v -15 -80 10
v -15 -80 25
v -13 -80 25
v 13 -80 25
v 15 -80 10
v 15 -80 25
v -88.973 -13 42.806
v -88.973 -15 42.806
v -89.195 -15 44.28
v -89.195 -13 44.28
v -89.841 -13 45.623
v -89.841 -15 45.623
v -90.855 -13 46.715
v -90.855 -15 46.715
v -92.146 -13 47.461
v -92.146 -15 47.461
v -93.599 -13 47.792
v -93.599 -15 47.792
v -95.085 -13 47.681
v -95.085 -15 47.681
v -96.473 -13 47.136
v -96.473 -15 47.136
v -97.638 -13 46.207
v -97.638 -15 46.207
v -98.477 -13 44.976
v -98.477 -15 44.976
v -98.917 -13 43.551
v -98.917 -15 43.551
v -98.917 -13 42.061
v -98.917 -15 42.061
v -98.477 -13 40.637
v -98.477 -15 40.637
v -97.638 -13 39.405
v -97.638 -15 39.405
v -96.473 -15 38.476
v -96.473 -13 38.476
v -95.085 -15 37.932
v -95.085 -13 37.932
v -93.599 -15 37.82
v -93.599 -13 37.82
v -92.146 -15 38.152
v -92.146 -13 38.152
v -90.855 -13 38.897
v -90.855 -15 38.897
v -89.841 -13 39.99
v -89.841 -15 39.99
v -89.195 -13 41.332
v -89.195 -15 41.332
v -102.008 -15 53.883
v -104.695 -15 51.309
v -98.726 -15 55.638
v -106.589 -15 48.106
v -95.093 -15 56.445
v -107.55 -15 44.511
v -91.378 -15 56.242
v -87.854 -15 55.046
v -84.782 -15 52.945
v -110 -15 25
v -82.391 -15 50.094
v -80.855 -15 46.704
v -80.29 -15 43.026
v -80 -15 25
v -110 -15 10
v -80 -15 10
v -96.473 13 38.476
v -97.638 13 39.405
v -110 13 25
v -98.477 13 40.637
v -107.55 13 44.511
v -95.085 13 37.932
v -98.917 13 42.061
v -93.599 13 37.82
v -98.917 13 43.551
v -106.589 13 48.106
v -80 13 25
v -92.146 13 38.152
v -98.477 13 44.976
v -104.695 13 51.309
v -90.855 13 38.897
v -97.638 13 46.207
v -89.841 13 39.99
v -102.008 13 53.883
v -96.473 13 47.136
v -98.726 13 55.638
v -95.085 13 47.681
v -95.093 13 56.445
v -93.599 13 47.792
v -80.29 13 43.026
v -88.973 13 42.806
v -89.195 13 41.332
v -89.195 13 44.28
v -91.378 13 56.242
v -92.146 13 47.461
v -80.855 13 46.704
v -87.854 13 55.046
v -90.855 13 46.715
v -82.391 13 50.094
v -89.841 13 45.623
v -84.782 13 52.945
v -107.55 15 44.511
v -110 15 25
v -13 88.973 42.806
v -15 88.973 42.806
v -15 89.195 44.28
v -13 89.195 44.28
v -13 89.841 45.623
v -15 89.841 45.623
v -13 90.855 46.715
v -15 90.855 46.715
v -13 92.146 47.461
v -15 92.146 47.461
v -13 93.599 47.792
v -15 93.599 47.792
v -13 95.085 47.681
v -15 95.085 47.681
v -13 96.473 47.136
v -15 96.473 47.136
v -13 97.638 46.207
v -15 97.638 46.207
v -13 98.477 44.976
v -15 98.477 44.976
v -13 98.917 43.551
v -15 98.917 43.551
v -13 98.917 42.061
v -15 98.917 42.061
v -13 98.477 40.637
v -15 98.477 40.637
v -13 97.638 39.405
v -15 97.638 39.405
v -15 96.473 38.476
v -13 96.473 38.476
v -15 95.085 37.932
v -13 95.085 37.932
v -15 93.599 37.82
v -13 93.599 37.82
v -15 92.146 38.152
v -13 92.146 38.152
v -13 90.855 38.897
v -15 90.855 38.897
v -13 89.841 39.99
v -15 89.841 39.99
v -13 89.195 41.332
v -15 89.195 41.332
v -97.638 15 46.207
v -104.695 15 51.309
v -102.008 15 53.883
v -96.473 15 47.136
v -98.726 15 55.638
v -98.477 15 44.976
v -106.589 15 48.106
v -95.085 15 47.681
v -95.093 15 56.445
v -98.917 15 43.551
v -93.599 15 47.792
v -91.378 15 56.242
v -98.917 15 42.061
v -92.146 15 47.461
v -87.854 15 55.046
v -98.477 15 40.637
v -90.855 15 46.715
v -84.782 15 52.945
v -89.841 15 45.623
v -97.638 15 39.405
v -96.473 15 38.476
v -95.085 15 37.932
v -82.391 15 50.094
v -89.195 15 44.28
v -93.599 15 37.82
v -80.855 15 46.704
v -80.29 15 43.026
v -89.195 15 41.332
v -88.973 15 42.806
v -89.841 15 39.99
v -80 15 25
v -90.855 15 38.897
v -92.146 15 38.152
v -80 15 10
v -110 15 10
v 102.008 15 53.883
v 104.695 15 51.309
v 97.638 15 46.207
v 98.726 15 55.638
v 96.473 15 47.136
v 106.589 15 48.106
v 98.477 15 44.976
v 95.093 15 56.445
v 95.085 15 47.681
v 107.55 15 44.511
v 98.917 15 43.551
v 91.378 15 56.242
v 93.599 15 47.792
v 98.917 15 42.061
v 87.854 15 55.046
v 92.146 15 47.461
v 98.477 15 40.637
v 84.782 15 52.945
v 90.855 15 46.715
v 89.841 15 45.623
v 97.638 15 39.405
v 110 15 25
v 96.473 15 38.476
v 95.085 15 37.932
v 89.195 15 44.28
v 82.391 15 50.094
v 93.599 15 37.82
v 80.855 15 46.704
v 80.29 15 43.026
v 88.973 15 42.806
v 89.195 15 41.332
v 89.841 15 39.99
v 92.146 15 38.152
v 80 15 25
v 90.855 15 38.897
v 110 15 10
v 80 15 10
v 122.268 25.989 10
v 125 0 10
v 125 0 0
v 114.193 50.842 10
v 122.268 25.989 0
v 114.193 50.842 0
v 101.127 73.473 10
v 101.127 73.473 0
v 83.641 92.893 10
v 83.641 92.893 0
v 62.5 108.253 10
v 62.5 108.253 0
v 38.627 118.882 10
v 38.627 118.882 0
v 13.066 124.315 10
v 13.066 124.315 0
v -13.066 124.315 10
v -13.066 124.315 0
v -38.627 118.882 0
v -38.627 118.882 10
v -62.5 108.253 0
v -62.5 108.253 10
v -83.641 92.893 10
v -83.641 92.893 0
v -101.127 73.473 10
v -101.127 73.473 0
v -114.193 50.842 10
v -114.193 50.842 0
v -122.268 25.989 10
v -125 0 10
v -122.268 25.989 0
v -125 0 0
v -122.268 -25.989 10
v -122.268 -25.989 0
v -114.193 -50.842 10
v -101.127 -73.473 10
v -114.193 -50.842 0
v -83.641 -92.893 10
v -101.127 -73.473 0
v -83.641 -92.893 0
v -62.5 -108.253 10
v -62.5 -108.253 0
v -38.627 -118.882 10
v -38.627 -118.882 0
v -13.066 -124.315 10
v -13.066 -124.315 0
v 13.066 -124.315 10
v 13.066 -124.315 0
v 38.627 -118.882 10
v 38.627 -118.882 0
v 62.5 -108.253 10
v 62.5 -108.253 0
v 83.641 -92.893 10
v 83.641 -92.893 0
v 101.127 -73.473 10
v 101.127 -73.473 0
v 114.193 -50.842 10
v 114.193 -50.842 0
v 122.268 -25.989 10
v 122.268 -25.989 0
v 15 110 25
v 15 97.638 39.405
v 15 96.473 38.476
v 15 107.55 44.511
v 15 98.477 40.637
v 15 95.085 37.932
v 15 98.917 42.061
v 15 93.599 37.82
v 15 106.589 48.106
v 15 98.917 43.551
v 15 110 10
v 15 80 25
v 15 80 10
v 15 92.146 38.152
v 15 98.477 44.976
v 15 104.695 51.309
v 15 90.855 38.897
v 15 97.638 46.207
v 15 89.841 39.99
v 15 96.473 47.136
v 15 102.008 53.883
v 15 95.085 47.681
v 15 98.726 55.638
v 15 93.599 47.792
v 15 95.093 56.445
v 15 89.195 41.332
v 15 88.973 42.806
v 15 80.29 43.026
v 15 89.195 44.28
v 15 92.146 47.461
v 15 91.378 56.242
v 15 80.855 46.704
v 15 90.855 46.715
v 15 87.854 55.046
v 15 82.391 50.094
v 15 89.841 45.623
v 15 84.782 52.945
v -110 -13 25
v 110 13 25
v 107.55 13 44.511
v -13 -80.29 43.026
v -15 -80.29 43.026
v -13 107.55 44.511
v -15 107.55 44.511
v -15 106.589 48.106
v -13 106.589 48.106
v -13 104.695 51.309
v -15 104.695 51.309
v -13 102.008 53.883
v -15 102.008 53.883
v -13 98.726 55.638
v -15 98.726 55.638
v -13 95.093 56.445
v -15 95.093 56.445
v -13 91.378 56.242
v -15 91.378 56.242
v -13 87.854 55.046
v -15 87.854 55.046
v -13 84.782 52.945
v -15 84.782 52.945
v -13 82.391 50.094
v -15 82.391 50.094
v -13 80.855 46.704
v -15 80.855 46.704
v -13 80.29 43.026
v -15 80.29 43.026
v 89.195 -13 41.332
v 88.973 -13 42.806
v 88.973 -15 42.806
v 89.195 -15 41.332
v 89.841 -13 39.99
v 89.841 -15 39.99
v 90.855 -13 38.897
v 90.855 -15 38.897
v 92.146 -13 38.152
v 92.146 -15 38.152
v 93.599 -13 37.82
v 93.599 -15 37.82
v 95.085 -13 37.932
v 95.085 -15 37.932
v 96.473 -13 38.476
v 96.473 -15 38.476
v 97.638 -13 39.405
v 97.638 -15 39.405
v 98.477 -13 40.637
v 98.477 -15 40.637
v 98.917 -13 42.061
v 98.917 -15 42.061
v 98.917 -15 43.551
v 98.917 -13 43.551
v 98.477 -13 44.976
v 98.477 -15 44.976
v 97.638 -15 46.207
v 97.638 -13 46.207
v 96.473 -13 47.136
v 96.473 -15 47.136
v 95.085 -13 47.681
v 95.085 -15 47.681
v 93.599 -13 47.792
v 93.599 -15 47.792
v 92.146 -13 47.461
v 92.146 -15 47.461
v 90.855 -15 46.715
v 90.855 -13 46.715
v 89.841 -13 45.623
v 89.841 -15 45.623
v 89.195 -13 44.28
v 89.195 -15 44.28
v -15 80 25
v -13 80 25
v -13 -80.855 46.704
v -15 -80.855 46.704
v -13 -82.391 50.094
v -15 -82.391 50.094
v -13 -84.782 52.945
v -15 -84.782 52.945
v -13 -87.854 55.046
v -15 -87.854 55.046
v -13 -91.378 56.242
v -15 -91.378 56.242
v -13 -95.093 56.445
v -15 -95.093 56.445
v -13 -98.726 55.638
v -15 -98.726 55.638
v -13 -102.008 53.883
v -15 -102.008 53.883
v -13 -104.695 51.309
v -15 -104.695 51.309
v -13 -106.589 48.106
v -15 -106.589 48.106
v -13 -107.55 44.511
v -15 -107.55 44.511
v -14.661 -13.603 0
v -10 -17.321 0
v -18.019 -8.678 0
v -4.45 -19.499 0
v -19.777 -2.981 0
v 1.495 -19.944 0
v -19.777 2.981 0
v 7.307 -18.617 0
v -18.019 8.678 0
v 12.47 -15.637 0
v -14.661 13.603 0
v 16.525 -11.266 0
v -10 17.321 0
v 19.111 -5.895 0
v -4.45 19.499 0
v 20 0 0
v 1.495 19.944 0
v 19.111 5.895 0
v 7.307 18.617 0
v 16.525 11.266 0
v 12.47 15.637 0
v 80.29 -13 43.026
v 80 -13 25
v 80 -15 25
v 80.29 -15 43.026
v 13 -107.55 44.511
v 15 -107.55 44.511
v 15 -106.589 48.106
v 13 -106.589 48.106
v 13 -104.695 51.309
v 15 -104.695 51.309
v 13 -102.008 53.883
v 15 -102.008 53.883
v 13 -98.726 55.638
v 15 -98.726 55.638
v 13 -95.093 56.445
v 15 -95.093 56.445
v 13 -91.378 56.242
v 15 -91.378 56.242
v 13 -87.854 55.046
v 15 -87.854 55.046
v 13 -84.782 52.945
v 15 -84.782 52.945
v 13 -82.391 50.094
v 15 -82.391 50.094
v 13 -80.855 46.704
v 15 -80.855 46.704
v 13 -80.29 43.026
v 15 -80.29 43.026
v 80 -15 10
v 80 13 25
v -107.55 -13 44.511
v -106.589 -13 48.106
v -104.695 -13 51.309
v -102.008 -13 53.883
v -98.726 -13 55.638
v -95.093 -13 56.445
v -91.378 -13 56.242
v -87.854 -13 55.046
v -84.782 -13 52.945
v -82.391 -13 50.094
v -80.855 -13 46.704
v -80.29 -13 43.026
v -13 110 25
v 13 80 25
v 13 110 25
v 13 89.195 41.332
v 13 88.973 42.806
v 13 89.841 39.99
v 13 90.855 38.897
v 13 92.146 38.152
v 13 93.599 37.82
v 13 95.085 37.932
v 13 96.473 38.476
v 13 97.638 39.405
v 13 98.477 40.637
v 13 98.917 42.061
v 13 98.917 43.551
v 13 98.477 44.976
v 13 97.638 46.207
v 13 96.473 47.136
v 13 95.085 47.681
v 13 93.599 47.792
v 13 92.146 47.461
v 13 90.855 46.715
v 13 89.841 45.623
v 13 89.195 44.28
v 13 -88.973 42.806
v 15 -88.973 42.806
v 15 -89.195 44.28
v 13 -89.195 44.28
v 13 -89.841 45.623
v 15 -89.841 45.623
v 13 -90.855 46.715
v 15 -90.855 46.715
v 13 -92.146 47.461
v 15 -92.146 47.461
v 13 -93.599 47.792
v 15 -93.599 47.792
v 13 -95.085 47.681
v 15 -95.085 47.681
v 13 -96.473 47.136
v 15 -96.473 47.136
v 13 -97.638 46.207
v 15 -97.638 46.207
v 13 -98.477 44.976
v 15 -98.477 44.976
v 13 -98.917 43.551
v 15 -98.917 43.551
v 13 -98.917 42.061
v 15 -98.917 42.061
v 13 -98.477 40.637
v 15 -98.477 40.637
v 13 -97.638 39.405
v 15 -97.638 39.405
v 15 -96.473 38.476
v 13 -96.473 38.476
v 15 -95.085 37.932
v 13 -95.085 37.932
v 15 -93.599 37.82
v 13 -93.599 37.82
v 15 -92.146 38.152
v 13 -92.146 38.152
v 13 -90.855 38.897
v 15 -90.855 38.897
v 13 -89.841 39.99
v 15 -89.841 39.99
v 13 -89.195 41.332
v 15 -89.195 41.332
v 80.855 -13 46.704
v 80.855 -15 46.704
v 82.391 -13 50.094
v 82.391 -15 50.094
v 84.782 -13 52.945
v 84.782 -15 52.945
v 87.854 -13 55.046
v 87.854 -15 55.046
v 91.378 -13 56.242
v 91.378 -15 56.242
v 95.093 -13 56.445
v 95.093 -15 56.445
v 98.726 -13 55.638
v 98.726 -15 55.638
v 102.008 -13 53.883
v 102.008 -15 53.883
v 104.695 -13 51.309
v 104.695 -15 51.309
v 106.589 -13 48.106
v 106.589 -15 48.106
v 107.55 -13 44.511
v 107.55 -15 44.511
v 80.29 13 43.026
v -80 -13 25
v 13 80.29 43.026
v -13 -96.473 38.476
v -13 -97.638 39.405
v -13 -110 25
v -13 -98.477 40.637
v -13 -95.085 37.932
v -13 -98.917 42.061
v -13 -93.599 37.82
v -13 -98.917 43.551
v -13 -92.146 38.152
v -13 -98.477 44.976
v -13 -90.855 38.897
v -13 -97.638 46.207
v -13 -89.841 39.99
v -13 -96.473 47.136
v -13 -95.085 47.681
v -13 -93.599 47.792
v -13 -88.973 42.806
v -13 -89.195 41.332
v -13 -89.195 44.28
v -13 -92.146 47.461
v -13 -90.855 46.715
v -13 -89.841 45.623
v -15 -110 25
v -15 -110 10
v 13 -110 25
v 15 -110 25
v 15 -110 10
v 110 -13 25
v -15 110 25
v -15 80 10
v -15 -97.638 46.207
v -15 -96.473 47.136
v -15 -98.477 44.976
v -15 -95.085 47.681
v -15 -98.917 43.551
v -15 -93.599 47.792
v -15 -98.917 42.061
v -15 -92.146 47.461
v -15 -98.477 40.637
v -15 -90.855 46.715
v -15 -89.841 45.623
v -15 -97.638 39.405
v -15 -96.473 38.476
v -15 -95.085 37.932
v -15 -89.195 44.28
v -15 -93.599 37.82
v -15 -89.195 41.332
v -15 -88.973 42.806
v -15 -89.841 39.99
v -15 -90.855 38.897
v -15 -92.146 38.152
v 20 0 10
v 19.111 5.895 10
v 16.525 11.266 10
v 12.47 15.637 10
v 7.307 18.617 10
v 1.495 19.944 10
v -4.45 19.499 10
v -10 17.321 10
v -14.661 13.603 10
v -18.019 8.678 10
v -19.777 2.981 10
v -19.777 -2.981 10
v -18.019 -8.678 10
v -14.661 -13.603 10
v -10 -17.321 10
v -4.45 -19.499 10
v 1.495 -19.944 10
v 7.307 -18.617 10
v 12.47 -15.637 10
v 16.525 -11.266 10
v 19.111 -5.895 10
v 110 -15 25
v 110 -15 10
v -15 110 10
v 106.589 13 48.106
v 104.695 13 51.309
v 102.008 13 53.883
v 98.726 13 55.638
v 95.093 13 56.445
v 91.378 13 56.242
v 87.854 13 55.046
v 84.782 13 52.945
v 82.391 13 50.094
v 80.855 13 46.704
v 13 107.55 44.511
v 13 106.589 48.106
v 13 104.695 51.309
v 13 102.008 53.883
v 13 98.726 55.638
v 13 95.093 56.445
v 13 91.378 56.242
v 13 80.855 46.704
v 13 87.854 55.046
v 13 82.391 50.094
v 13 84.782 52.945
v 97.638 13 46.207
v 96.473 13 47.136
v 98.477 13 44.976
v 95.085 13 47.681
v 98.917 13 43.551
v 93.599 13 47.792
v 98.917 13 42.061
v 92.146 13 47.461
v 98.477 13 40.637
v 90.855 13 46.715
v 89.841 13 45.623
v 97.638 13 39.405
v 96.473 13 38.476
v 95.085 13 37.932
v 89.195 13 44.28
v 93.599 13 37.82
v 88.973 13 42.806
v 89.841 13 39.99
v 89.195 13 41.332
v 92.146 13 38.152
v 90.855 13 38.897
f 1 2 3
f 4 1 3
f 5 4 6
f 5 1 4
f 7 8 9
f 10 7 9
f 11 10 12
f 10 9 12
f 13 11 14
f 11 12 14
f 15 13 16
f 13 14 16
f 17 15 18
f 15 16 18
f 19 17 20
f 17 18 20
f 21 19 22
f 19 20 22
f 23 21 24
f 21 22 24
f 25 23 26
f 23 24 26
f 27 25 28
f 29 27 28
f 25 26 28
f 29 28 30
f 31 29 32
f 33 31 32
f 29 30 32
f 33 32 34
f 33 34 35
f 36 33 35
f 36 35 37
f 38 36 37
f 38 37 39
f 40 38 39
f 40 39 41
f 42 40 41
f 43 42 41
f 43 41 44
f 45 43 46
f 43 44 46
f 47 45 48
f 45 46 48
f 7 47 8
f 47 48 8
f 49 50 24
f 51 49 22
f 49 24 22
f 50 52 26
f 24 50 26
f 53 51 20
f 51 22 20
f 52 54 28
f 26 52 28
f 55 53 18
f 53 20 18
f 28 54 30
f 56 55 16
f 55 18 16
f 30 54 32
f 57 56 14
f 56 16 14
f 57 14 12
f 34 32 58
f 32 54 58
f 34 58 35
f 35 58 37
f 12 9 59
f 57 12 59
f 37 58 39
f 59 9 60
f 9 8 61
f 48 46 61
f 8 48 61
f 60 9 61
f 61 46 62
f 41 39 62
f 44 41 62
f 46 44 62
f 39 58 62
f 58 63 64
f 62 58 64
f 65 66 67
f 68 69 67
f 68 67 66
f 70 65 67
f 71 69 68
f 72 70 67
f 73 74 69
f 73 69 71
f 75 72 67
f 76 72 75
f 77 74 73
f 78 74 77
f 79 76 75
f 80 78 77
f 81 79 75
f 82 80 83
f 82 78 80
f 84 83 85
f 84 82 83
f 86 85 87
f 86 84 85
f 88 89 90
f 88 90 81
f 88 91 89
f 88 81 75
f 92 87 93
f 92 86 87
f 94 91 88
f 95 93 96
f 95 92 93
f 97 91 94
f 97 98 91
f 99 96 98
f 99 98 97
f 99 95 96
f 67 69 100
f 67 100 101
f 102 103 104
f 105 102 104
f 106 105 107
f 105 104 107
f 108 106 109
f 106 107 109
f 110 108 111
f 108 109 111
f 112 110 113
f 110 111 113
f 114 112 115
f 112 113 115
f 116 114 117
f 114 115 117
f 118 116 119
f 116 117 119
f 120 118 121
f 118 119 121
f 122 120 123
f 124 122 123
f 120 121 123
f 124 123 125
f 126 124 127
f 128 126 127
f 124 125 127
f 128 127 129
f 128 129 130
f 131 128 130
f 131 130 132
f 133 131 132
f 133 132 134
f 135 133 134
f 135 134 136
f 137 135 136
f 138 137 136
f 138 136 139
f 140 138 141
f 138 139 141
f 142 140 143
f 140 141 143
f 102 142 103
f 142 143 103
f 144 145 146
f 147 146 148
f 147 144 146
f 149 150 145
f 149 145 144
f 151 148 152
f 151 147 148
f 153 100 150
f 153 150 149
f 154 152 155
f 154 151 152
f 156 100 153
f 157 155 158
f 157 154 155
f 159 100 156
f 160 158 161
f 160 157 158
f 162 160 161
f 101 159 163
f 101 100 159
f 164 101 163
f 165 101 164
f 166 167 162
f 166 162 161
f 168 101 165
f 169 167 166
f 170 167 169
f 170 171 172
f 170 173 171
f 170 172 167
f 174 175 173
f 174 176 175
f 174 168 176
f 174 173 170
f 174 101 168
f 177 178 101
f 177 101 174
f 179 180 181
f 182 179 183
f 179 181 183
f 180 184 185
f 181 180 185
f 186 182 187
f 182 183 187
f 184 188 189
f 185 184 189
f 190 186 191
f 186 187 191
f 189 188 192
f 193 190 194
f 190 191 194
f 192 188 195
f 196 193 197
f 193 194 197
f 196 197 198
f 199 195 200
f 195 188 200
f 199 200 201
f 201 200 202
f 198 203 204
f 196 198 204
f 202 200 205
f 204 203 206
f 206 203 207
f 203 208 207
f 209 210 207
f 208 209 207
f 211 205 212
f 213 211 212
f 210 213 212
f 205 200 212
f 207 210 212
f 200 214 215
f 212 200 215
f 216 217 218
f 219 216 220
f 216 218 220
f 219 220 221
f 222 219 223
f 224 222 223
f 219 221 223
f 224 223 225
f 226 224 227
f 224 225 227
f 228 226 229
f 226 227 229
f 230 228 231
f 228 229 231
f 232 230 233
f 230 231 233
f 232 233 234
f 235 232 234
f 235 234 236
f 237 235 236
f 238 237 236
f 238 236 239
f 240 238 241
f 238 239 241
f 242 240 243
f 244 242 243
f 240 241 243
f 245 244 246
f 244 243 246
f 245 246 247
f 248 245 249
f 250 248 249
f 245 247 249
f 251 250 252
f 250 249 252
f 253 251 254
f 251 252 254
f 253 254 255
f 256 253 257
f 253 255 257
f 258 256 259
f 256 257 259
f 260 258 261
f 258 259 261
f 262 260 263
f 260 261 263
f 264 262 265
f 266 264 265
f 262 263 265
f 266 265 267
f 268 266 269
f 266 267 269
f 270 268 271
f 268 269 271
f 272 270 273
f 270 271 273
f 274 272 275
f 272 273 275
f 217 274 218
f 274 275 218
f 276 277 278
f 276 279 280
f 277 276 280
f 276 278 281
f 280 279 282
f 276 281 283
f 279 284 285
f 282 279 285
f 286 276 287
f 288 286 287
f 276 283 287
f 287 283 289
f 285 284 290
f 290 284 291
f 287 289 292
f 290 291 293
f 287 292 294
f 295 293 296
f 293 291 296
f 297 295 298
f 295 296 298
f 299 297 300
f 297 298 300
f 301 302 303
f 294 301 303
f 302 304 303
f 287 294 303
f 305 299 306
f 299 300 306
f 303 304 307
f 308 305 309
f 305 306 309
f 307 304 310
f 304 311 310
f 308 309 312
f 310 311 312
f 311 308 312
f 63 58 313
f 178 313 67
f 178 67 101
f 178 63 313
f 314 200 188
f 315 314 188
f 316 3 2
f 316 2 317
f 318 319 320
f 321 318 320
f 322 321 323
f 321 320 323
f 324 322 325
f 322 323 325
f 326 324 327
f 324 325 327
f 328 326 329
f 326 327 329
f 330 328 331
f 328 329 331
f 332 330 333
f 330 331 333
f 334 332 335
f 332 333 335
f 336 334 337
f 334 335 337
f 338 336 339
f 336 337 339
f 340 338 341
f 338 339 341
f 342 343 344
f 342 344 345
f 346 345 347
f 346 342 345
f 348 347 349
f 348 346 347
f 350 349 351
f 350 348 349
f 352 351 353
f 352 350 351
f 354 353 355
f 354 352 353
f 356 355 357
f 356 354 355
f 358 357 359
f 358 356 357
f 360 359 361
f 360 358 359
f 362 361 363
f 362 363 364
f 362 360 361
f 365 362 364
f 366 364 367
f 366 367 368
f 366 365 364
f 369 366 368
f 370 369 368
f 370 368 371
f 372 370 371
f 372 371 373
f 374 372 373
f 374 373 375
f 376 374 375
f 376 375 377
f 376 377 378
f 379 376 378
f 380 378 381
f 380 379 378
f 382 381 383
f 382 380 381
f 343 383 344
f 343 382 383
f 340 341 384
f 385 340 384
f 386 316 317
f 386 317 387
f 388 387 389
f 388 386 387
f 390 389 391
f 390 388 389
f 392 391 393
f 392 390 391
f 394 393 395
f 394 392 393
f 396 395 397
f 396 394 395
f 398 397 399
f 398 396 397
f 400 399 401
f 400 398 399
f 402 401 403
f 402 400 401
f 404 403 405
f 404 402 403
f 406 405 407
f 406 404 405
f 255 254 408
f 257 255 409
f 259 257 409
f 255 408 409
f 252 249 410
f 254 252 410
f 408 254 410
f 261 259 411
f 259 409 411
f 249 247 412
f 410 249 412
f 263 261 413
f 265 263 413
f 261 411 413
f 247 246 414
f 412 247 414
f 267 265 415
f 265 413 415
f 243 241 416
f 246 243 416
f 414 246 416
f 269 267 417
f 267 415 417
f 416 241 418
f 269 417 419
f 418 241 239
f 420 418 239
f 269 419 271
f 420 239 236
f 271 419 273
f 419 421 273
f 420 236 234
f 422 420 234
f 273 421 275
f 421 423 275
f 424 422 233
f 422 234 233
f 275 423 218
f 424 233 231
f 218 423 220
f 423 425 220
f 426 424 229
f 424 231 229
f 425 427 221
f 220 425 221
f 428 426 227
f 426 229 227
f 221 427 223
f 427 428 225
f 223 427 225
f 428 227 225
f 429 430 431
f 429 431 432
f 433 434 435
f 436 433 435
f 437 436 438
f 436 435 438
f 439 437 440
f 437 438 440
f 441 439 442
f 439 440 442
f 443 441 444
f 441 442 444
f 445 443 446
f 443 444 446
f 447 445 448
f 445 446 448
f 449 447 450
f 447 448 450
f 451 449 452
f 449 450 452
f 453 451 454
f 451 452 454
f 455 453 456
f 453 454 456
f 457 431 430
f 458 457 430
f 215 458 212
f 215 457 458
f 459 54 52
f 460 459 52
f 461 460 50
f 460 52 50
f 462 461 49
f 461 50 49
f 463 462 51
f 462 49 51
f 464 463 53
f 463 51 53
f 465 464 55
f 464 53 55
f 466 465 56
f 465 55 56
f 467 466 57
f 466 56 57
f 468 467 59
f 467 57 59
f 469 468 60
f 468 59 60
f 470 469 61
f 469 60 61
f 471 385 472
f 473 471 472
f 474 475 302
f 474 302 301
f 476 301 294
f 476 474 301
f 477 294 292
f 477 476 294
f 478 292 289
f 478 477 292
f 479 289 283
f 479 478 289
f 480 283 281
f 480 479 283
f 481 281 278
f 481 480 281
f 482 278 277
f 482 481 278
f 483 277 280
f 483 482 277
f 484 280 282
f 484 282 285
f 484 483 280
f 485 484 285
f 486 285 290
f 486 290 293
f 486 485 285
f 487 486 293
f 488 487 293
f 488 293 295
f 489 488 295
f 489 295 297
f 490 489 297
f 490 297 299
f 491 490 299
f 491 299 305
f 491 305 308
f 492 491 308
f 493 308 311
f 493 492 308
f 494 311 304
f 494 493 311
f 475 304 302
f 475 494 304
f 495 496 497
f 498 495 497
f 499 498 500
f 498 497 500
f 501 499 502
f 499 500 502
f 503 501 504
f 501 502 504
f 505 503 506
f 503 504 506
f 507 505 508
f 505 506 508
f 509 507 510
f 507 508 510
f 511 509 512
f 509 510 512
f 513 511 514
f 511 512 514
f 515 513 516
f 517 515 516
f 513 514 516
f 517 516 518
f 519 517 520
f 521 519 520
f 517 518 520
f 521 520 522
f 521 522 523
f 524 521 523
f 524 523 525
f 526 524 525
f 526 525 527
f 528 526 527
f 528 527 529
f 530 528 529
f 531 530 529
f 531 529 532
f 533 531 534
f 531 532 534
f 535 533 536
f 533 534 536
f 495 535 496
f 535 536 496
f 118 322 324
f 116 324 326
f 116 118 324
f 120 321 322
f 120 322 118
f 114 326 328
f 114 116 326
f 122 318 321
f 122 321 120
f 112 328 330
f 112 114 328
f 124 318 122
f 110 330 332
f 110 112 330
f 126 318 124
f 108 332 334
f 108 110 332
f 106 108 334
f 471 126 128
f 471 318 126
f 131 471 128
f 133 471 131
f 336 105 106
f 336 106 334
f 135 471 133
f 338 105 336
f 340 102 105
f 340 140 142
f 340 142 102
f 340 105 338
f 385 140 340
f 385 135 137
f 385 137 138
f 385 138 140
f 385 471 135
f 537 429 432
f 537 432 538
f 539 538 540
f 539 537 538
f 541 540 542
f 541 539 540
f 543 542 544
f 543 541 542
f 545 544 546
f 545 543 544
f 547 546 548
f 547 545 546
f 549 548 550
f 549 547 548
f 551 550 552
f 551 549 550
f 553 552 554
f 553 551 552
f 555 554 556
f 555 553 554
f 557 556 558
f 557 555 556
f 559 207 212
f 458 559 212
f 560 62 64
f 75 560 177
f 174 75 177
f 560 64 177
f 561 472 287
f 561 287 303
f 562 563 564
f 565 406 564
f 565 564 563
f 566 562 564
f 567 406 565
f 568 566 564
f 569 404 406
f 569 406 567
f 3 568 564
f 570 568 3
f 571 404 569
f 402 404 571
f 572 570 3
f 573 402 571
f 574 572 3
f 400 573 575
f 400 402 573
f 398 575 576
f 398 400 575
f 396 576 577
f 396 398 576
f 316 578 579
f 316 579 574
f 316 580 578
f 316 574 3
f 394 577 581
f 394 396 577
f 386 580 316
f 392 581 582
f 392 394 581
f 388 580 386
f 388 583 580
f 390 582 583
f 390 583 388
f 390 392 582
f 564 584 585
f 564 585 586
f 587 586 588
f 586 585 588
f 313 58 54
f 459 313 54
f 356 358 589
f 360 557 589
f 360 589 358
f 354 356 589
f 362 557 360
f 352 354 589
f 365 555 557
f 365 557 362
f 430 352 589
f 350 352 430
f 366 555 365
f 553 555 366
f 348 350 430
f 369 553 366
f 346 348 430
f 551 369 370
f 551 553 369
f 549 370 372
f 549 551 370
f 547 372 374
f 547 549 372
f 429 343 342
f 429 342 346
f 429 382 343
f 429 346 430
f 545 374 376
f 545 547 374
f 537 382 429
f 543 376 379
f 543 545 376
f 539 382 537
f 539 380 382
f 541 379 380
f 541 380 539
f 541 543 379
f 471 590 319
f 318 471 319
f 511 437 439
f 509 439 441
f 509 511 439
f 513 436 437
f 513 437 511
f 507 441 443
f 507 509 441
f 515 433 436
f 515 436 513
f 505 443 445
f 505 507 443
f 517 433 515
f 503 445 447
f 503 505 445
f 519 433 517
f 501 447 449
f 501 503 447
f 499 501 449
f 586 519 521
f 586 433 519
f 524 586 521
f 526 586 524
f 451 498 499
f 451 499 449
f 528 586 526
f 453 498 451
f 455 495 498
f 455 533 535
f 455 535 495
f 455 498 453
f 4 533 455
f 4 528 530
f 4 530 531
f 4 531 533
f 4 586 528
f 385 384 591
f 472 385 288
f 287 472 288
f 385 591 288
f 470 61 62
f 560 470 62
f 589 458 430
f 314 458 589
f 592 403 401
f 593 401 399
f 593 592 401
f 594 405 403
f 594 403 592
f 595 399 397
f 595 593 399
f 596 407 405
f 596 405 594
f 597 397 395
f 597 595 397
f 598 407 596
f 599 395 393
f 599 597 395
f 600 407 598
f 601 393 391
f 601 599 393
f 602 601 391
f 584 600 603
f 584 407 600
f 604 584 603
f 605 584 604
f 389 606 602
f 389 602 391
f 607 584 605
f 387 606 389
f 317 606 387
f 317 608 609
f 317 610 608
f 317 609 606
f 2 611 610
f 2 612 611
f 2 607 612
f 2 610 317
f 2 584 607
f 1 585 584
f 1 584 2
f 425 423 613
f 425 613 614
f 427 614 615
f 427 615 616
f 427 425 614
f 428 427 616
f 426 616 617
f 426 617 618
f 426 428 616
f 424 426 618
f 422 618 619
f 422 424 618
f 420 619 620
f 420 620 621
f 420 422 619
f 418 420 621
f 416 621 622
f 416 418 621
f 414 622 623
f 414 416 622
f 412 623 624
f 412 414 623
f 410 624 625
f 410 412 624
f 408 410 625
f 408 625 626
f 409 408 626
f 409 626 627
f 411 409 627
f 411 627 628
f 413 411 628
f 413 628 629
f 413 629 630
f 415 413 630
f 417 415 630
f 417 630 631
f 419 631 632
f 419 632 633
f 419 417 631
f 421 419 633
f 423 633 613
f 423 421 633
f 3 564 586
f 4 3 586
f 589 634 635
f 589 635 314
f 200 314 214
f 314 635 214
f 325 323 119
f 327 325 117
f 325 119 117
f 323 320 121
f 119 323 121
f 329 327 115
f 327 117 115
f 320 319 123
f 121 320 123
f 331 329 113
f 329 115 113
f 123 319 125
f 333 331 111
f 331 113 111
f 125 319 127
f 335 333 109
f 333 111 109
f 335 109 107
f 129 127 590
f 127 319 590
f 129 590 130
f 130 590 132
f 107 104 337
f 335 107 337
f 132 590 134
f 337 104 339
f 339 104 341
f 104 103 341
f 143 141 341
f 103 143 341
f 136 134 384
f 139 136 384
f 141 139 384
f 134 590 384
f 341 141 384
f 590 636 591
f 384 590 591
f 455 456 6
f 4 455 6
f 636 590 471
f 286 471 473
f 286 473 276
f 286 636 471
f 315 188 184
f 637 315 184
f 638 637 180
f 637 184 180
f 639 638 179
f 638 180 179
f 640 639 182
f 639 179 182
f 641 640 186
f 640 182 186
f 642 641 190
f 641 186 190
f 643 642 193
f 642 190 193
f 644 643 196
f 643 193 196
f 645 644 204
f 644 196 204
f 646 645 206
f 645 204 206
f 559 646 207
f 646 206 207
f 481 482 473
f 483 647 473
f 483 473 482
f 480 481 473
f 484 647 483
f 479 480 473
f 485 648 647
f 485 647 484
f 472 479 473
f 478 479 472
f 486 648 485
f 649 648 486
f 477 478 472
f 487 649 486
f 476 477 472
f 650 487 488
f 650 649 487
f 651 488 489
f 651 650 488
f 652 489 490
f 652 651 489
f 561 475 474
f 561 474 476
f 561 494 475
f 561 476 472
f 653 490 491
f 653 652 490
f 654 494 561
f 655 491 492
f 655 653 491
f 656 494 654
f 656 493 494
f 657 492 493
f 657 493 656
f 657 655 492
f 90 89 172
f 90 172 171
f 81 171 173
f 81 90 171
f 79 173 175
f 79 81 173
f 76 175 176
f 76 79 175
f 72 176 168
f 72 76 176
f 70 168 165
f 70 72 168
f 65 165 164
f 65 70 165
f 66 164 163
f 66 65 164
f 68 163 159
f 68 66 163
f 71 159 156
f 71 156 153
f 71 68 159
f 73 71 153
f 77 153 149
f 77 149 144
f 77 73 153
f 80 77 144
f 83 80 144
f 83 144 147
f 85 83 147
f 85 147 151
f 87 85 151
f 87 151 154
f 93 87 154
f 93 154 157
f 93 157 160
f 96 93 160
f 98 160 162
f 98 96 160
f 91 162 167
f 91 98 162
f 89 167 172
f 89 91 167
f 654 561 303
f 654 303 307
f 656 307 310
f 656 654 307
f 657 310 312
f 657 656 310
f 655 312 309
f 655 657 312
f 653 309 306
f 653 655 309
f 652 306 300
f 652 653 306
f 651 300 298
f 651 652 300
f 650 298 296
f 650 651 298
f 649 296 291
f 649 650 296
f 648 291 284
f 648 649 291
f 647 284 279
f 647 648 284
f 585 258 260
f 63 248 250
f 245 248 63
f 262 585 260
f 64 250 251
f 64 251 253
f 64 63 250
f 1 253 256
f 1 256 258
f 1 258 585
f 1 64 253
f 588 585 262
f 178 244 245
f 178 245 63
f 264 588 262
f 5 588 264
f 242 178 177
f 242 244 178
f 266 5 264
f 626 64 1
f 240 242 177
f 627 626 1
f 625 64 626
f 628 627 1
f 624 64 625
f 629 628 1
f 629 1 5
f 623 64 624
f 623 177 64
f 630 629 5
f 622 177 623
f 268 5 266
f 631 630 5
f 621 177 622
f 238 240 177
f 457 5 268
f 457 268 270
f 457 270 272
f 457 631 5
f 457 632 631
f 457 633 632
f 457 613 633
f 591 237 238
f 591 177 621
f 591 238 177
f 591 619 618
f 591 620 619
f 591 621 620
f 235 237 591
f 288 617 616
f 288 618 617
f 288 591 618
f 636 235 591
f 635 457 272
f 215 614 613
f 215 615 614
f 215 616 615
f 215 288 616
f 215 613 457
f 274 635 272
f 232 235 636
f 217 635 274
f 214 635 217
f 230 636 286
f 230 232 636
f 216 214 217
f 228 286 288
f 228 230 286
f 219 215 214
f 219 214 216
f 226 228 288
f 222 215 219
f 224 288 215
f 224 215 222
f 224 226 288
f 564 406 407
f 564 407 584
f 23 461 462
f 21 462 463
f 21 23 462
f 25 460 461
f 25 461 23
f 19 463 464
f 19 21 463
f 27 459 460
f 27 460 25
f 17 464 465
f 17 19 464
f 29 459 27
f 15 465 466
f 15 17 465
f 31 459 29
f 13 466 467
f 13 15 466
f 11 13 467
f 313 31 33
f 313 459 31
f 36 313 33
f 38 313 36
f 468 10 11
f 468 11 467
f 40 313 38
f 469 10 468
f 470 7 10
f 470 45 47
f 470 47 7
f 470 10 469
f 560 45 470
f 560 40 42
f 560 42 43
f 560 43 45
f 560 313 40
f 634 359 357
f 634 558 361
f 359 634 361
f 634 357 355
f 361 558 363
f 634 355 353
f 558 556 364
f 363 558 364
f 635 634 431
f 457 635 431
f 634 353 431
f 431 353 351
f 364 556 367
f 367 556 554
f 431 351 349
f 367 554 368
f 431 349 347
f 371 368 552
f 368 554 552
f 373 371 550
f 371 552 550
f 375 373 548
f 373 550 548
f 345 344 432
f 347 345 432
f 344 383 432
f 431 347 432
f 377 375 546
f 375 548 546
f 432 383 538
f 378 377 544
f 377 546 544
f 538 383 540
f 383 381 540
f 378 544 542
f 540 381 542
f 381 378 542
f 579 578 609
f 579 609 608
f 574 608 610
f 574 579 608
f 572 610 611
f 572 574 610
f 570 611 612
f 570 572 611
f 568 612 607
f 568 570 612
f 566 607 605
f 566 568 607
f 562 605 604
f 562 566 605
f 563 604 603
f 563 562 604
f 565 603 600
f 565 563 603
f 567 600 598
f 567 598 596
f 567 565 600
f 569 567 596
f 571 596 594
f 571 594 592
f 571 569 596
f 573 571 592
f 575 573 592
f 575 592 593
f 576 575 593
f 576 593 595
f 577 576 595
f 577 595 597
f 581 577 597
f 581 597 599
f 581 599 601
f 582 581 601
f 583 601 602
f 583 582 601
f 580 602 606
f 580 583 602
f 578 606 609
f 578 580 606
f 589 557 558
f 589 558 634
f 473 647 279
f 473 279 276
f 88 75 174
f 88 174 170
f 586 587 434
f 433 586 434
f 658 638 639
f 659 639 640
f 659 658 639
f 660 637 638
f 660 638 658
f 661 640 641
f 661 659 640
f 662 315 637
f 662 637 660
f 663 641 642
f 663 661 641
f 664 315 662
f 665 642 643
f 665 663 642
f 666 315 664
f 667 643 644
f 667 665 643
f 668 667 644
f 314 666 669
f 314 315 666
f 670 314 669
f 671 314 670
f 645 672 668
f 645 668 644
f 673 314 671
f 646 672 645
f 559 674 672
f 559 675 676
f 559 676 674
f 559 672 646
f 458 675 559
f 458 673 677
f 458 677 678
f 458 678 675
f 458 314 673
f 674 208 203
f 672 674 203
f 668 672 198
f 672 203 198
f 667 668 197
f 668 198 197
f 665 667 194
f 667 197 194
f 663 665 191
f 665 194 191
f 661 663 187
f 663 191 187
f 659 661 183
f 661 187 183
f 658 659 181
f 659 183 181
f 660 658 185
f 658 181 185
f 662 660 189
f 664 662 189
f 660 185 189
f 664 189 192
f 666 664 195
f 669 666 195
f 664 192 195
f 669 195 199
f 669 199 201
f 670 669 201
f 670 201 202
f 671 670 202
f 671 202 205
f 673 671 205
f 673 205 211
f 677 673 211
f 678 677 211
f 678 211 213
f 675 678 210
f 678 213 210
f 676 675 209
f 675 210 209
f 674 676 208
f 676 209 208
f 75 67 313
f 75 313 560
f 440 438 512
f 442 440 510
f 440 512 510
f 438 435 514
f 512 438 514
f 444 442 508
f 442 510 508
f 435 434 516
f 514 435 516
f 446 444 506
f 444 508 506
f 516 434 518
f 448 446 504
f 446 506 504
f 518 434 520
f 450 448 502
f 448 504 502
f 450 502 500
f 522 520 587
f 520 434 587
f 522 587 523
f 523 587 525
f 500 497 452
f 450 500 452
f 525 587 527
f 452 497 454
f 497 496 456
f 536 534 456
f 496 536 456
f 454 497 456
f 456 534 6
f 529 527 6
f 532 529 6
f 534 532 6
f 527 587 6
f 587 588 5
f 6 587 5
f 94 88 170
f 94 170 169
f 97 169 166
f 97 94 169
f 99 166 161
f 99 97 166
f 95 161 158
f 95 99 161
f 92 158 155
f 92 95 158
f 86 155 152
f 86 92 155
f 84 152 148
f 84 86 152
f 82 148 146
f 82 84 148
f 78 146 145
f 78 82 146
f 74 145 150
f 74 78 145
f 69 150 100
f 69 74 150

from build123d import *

# Parameters (mm, degrees)
SKETCH_1_R               = 125
SKETCH_1_W               = 30
SKETCH_1_H               = 30
SKETCH_1_R_2             = 20
EXTRUDE_1_DEPTH          = 10
SKETCH_1_3_W             = 30
SKETCH_1_3_H             = 30
EXTRUDE_2_DEPTH          = 25
SKETCH_7_R               = 5
EXTRUDE_3_DEPTH          = 2
EXTRUDE_START            = -2
SKETCH_4_R               = 5
EXTRUDE_4_DEPTH          = 2
PATTERN_CIRCULAR_1_COUNT = 4


with BuildPart() as part:
    # 草图1 → 凸台-拉伸1 (new body)
    with BuildSketch(Plane.XY):
        Circle(SKETCH_1_R)
        with Locations((0, -95)):
            Rectangle(SKETCH_1_W, SKETCH_1_H, mode=Mode.SUBTRACT)
        Circle(SKETCH_1_R_2, mode=Mode.SUBTRACT)
        with Locations((95, 0)):
            Rectangle(SKETCH_1_W, SKETCH_1_H, mode=Mode.SUBTRACT)
        with Locations((-95, 0)):
            Rectangle(SKETCH_1_W, SKETCH_1_H, mode=Mode.SUBTRACT)
        with Locations((0, 95)):
            Rectangle(SKETCH_1_W, SKETCH_1_H, mode=Mode.SUBTRACT)
    extrude(amount=EXTRUDE_1_DEPTH)

    # 草图1<3> → 凸台-拉伸2 (add)
    with BuildSketch(Plane.XY):
        with Locations((-95, 0)):
            Rectangle(SKETCH_1_3_W, SKETCH_1_3_H)
        with Locations((0, 95)):
            Rectangle(SKETCH_1_3_W, SKETCH_1_3_H)
        with Locations((0, -95)):
            Rectangle(SKETCH_1_3_W, SKETCH_1_3_H)
        with Locations((95, 0)):
            Rectangle(SKETCH_1_3_W, SKETCH_1_3_H)
    extrude(amount=EXTRUDE_2_DEPTH)

    # 草图7 → 凸台-拉伸3 (add)
    with BuildSketch(Plane(origin=(0, 15, 0), x_dir=(1, 0, 0), z_dir=(0, 1, 0))):
        with BuildLine():
            ThreePointArc((80.290043894, -43.026337076), (93.228538873, -56.470313397), (107.550432268, -44.510860179))
            Line((107.550432268, -44.510860179), (110, -25))
            Line((110, -25), (80, -25))
            Line((80, -25), (80.290043894, -43.026337076))
        make_face()
        with Locations((93.972648447, -42.80618387)):
            Circle(SKETCH_7_R, mode=Mode.SUBTRACT)
    extrude_3 = extrude(amount=-EXTRUDE_3_DEPTH)

    # 草图4 → 凸台-拉伸4 (add)
    with BuildSketch(Plane.XZ.offset(15).offset(EXTRUDE_START)):
        with BuildLine():
            Line((110, 25), (107.550432268, 44.510860179))
            ThreePointArc((107.550432268, 44.510860179), (93.228538873, 56.470313397), (80.290043894, 43.026337076))
            Line((80.290043894, 43.026337076), (80, 25))
            Line((80, 25), (110, 25))
        make_face()
        with Locations((93.972648447, 42.80618387)):
            Circle(SKETCH_4_R, mode=Mode.SUBTRACT)
    extrude_4 = extrude(amount=EXTRUDE_4_DEPTH)

    # 阵列(圆周)1: 凸台-拉伸3, 凸台-拉伸4 ×4 about axis
    pattern_circular_1_axis = Axis((0, 0, 10), (0, 0, 1))
    add([extrude_3.rotate(pattern_circular_1_axis, i * 360 / PATTERN_CIRCULAR_1_COUNT) for i in range(1, PATTERN_CIRCULAR_1_COUNT)])
    add([extrude_4.rotate(pattern_circular_1_axis, i * 360 / PATTERN_CIRCULAR_1_COUNT) for i in range(1, PATTERN_CIRCULAR_1_COUNT)])


solid = part.part
